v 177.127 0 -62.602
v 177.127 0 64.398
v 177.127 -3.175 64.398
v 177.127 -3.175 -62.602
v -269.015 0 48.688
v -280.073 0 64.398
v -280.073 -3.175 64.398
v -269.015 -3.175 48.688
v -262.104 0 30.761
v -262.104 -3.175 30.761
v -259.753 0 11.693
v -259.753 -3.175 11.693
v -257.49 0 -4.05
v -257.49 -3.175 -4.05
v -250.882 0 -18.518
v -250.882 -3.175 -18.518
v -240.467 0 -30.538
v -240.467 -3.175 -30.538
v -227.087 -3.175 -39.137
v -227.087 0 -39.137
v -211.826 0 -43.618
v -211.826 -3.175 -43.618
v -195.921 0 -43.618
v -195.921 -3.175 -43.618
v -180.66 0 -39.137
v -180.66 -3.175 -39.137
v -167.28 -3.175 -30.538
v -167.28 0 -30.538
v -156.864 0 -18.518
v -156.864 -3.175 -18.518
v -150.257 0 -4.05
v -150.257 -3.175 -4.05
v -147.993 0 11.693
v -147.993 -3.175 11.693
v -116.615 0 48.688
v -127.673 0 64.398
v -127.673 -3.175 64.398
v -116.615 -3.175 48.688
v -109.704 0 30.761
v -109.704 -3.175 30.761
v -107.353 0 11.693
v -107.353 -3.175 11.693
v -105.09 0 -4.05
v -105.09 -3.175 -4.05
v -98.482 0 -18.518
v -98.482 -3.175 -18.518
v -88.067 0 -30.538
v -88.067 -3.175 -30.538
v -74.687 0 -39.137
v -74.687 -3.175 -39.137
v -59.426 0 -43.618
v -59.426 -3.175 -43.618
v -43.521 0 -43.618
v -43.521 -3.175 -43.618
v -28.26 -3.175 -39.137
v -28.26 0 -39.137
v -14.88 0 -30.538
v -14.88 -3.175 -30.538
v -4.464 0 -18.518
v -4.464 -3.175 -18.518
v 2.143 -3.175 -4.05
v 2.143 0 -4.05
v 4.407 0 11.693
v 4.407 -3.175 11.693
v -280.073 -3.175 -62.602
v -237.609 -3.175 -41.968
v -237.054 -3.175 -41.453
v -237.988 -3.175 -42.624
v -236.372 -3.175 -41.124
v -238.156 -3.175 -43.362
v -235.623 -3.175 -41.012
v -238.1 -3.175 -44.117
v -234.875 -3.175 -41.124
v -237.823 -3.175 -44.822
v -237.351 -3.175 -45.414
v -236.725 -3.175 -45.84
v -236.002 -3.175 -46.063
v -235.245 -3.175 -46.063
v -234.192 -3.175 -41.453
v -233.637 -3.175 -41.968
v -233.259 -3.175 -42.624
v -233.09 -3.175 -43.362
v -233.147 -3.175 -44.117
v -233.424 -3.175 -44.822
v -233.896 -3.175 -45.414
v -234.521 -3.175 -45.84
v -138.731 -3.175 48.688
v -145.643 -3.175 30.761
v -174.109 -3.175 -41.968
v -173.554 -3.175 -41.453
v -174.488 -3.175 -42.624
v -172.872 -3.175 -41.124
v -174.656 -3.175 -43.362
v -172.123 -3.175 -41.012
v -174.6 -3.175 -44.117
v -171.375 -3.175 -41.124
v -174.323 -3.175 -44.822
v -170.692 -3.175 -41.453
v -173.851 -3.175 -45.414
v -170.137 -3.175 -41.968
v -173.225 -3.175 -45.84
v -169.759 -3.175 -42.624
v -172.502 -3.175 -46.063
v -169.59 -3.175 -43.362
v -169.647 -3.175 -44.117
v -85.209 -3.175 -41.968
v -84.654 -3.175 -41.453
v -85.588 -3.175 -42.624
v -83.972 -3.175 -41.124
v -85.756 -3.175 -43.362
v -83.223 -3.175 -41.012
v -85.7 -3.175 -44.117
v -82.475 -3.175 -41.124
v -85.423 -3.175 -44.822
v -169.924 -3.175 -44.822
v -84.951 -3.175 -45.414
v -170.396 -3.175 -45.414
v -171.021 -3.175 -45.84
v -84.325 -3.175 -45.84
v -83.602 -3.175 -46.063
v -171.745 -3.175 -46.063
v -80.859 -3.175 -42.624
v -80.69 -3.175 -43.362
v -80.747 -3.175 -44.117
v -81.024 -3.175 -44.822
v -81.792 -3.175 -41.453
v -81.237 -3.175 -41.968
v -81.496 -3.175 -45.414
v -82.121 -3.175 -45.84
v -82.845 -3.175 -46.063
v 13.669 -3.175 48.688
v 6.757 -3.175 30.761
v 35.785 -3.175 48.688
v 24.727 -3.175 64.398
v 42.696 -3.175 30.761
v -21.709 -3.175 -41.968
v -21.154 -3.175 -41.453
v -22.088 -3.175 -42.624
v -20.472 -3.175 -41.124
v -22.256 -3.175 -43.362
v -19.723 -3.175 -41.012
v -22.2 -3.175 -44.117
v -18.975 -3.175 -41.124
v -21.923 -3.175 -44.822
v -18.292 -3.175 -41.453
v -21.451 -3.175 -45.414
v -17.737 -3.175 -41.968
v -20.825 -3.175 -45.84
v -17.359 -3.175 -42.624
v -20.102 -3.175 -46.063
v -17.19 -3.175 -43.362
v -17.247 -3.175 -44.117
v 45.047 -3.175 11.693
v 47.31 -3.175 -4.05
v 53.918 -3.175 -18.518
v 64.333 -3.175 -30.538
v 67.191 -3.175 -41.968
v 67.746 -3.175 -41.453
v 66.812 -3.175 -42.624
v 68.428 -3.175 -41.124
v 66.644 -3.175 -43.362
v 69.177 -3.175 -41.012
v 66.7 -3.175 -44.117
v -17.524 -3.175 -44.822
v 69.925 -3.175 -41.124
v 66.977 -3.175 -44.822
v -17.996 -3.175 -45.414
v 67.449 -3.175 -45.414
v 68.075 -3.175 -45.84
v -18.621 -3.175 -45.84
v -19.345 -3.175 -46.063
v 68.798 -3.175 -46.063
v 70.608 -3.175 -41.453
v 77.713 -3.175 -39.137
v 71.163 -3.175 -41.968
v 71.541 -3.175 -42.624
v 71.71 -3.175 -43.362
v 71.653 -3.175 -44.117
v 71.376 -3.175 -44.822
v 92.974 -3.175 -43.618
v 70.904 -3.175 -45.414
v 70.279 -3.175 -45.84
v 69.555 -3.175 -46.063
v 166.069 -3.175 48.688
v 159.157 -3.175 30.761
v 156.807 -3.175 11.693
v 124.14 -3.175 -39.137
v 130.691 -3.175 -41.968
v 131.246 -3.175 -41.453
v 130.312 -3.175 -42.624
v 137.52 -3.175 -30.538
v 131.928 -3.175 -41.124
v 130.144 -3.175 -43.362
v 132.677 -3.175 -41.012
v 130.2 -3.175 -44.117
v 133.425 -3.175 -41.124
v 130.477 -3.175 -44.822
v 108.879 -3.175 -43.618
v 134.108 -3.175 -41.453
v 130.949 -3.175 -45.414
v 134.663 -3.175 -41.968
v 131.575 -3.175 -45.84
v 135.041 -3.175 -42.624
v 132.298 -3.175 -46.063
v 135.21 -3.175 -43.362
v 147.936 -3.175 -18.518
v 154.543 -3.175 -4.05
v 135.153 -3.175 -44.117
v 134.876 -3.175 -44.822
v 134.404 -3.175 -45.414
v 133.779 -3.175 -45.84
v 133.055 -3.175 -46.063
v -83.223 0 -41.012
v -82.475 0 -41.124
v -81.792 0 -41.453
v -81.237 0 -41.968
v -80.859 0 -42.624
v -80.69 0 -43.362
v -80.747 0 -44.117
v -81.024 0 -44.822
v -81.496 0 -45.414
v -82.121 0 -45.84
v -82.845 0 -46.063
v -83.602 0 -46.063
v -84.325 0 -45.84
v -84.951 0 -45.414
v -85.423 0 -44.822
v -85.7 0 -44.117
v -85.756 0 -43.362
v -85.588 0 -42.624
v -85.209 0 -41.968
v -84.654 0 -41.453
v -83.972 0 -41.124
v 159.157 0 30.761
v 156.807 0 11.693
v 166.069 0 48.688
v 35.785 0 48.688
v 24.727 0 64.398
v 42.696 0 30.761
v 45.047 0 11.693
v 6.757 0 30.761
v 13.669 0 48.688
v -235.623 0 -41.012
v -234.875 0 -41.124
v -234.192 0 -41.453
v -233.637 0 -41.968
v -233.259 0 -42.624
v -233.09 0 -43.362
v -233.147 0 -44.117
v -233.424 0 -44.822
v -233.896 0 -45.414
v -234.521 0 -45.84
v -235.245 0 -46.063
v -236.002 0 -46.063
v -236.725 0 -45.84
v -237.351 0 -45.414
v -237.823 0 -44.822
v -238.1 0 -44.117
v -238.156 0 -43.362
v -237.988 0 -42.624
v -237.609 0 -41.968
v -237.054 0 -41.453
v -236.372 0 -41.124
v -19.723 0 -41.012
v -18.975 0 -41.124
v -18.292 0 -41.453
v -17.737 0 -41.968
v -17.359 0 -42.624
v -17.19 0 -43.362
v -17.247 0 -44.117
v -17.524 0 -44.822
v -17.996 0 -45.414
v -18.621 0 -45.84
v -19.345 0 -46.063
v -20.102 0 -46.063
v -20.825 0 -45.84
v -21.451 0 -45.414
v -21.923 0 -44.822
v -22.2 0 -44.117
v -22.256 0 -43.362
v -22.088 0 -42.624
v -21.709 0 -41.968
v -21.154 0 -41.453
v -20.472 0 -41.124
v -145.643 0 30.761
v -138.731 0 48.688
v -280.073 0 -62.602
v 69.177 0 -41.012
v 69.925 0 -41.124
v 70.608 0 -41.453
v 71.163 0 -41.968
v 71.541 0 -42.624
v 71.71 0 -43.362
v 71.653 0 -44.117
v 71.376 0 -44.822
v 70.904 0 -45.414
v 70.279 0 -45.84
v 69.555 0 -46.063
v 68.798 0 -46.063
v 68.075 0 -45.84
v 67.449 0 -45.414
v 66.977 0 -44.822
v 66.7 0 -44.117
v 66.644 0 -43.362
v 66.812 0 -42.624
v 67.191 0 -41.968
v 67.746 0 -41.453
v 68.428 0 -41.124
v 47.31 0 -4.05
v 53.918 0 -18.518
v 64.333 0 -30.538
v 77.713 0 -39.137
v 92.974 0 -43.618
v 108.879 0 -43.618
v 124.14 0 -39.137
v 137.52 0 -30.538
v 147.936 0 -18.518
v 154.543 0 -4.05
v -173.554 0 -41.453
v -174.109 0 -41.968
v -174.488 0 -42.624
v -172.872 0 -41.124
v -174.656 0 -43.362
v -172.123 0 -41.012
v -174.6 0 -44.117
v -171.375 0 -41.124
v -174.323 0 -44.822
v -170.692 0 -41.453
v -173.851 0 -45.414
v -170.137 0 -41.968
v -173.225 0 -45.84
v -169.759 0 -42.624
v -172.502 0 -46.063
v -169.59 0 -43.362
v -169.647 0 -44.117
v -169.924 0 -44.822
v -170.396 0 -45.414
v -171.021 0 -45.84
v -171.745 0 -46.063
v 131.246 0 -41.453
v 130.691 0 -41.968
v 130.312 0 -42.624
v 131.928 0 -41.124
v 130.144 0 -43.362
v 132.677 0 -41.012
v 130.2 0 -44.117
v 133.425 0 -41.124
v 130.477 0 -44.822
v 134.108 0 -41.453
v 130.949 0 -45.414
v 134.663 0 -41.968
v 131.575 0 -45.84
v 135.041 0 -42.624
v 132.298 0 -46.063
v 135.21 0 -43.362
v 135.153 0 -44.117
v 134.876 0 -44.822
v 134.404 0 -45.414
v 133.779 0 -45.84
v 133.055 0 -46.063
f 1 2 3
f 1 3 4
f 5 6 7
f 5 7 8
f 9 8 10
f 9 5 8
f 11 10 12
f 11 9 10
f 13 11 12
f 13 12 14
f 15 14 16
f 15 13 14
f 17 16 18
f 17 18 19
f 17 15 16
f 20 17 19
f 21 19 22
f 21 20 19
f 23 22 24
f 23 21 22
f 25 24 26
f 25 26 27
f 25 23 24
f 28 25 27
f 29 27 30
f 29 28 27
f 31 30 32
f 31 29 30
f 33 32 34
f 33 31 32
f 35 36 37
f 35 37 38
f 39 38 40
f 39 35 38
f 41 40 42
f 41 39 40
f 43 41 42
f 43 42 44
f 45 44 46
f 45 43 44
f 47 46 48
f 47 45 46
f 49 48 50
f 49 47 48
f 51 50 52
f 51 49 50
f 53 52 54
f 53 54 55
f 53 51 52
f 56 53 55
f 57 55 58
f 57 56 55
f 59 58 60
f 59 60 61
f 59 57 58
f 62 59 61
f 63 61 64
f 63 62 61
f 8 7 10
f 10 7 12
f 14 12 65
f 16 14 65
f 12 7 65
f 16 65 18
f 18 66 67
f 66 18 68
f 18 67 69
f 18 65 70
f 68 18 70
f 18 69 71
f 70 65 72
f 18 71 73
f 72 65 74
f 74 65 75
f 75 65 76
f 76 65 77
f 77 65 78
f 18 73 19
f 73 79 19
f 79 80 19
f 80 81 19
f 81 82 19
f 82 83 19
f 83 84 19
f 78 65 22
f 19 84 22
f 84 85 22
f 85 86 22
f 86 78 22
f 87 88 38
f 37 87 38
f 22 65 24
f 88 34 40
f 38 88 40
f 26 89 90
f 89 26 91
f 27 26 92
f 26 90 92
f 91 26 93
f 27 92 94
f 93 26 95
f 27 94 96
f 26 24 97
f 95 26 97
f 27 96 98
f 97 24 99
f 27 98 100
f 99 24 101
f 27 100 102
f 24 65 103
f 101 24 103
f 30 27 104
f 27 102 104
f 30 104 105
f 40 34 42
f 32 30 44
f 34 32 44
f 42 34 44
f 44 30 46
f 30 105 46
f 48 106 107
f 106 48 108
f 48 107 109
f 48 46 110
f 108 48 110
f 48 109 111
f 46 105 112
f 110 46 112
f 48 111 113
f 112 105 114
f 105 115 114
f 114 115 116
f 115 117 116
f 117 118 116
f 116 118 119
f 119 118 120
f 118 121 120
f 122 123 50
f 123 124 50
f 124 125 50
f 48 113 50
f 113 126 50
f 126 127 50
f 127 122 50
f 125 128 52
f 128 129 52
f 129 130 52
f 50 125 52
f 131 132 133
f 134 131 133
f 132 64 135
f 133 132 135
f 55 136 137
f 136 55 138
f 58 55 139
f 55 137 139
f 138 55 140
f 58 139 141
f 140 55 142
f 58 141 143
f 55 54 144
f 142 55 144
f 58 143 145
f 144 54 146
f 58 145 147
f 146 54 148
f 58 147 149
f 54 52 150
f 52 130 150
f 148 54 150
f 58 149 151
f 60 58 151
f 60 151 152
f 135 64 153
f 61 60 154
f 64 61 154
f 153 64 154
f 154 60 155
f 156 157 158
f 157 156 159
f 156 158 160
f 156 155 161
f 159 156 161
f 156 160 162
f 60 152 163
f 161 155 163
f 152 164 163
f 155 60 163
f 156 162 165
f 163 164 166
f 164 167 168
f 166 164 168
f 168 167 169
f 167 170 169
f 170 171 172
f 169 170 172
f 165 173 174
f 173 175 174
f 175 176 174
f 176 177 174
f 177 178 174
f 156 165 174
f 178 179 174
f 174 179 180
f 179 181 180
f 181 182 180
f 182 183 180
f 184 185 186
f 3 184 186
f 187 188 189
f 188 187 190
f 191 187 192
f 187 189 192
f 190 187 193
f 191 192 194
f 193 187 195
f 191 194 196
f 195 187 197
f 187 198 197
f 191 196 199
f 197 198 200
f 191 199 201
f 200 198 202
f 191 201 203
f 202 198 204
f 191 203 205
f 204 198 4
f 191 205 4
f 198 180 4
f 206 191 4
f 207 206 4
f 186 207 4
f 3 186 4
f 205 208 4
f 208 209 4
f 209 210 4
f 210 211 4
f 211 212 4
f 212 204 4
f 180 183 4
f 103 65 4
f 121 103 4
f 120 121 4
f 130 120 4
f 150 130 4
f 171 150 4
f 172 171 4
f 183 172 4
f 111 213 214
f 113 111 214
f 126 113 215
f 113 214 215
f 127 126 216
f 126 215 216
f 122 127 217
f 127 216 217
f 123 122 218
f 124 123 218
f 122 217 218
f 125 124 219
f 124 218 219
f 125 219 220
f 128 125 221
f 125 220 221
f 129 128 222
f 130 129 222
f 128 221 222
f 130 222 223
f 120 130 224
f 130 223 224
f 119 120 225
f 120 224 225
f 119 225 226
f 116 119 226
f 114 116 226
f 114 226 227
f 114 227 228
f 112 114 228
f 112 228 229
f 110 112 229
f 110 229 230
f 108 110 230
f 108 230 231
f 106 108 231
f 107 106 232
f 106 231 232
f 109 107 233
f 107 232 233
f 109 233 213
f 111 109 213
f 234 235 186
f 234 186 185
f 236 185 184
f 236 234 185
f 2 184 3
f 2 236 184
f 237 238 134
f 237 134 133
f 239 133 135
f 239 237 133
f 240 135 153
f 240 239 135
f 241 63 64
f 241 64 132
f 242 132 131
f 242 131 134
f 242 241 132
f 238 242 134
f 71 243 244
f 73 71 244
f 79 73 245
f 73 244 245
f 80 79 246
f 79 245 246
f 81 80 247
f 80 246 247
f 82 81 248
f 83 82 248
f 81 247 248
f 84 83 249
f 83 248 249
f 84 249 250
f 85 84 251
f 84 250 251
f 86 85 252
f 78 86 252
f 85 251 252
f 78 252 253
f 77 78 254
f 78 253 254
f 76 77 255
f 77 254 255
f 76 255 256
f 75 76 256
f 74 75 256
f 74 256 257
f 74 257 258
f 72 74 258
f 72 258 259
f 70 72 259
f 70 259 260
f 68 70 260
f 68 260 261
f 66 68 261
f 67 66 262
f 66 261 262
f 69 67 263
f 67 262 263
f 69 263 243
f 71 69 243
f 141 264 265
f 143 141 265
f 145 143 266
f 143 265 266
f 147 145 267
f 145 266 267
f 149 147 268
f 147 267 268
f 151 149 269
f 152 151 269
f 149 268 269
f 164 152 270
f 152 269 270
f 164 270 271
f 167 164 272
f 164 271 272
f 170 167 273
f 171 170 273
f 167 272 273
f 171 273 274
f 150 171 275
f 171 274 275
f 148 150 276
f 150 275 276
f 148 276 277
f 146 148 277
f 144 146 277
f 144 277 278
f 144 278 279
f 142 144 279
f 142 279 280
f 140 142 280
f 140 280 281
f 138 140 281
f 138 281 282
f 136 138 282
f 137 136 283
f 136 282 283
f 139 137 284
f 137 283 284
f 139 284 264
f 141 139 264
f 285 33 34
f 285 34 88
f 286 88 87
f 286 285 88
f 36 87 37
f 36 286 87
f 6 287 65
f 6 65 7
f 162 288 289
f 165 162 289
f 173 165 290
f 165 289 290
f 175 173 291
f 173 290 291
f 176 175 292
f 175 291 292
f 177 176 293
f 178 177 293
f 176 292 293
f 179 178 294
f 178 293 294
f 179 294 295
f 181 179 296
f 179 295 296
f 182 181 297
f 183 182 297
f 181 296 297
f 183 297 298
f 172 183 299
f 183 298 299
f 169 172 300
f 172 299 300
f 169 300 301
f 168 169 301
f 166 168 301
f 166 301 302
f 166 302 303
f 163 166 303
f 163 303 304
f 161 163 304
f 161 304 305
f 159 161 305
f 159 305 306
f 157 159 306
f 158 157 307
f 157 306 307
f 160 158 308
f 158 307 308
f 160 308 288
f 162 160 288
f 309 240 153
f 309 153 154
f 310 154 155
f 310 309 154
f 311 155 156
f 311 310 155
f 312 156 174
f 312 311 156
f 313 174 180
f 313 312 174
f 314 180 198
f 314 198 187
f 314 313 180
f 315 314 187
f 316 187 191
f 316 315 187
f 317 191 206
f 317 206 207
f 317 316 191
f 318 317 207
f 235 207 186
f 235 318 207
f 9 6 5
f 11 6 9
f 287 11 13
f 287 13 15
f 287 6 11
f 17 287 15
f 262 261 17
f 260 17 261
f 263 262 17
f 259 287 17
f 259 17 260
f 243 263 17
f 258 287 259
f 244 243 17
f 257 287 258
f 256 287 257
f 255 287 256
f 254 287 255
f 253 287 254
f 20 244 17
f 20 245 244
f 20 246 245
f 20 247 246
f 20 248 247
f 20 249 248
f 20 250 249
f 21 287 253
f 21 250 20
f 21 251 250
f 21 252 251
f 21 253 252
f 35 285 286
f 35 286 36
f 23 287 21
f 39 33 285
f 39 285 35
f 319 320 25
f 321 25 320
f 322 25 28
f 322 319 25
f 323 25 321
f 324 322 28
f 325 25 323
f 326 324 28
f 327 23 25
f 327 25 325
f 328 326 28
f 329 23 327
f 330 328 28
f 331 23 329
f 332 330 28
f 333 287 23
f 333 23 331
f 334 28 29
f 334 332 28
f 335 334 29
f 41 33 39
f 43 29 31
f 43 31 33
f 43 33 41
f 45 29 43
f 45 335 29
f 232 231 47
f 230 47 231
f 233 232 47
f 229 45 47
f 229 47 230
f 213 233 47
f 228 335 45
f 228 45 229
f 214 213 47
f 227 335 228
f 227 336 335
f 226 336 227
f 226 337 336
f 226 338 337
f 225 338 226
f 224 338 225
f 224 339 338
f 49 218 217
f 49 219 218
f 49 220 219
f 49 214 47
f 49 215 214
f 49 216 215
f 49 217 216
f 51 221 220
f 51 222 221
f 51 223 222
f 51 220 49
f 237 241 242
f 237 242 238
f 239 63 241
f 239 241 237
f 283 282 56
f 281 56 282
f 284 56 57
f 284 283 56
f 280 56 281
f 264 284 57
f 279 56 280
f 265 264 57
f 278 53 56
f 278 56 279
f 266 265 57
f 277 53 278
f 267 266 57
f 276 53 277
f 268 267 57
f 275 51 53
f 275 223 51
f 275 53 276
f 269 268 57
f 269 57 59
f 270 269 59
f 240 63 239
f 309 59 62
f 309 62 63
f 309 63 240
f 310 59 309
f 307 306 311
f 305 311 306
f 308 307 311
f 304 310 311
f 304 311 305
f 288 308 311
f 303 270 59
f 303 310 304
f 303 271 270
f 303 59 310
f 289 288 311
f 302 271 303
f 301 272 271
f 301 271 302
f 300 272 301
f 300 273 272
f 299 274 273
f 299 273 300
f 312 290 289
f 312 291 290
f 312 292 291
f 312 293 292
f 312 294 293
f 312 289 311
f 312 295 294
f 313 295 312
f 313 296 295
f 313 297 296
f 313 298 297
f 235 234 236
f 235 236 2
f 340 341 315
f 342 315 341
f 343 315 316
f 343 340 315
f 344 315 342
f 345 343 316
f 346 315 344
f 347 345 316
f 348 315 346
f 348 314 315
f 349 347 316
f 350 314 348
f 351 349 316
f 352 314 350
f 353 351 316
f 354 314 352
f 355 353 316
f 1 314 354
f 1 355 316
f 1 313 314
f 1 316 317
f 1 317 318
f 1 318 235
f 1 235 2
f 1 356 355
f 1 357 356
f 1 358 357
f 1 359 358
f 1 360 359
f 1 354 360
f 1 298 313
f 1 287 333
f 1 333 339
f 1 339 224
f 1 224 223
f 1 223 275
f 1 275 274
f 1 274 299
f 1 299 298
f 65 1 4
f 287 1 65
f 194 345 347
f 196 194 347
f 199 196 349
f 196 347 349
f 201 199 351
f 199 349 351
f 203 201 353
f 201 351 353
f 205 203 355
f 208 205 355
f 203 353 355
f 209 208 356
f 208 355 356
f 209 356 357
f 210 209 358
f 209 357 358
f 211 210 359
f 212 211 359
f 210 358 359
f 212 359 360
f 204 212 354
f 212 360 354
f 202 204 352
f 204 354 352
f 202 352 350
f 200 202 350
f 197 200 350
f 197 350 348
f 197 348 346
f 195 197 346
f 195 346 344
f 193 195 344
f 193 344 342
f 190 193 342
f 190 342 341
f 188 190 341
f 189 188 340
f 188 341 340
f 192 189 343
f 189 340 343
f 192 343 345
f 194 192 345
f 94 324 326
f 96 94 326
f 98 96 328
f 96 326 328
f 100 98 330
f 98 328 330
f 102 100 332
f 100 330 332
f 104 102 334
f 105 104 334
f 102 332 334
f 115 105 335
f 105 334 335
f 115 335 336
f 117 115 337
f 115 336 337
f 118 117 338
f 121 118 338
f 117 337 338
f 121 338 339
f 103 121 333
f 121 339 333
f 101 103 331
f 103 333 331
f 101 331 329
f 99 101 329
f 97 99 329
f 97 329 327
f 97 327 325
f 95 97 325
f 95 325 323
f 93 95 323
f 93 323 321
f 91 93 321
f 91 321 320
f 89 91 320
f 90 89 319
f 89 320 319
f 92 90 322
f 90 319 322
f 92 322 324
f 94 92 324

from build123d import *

# Parameters (mm, degrees)
SKETCH1_R           = 2.54
BOSS_EXTRUDE1_DEPTH = 3.175


with BuildPart() as part:
    # Sketch1 → Boss-Extrude1 (new body)
    with BuildSketch(Plane(origin=(0, 0, 0), x_dir=(1, 0, 0), z_dir=(0, 1, 0))):
        with BuildLine():
            ThreePointArc((-147.993238202, -11.693423436), (-142.737310664, -39.936650168), (-127.673238202, -64.398423436))
            ThreePointArc((-127.673238202, -64.398423436), (-112.609165741, -39.936650168), (-107.353238202, -11.693423436))
            ThreePointArc((-107.353238202, -11.693423436), (-51.473238202, 44.186576564), (4.406761798, -11.693423436))
            ThreePointArc((4.406761798, -11.693423436), (9.662689336, -39.936650168), (24.726761798, -64.398423436))
            ThreePointArc((24.726761798, -64.398423436), (39.790834259, -39.936650168), (45.046761798, -11.693423436))
            ThreePointArc((45.046761798, -11.693423436), (100.926761798, 44.186576564), (156.806761798, -11.693423436))
            ThreePointArc((156.806761798, -11.693423436), (162.062689336, -39.936650168), (177.126761798, -64.398423436))
            Line((177.126761798, -64.398423436), (177.126761798, 62.601576564))
            Line((177.126761798, 62.601576564), (-280.073238202, 62.601576564))
            Line((-280.073238202, 62.601576564), (-280.073238202, -64.398423436))
            ThreePointArc((-280.073238202, -64.398423436), (-265.009165741, -39.936650168), (-259.753238202, -11.693423436))
            ThreePointArc((-259.753238202, -11.693423436), (-203.873238202, 44.186576564), (-147.993238202, -11.693423436))
        make_face()
        with Locations((-235.623238202, 43.551576564)):
            Circle(SKETCH1_R, mode=Mode.SUBTRACT)
        with Locations((-172.123238202, 43.551576564)):
            Circle(SKETCH1_R, mode=Mode.SUBTRACT)
        with Locations((-19.723238202, 43.551576564)):
            Circle(SKETCH1_R, mode=Mode.SUBTRACT)
        with Locations((-83.223238202, 43.551576564)):
            Circle(SKETCH1_R, mode=Mode.SUBTRACT)
        with Locations((132.676761798, 43.551576564)):
            Circle(SKETCH1_R, mode=Mode.SUBTRACT)
        with Locations((69.176761798, 43.551576564)):
            Circle(SKETCH1_R, mode=Mode.SUBTRACT)
    extrude(amount=-BOSS_EXTRUDE1_DEPTH)


solid = part.part
